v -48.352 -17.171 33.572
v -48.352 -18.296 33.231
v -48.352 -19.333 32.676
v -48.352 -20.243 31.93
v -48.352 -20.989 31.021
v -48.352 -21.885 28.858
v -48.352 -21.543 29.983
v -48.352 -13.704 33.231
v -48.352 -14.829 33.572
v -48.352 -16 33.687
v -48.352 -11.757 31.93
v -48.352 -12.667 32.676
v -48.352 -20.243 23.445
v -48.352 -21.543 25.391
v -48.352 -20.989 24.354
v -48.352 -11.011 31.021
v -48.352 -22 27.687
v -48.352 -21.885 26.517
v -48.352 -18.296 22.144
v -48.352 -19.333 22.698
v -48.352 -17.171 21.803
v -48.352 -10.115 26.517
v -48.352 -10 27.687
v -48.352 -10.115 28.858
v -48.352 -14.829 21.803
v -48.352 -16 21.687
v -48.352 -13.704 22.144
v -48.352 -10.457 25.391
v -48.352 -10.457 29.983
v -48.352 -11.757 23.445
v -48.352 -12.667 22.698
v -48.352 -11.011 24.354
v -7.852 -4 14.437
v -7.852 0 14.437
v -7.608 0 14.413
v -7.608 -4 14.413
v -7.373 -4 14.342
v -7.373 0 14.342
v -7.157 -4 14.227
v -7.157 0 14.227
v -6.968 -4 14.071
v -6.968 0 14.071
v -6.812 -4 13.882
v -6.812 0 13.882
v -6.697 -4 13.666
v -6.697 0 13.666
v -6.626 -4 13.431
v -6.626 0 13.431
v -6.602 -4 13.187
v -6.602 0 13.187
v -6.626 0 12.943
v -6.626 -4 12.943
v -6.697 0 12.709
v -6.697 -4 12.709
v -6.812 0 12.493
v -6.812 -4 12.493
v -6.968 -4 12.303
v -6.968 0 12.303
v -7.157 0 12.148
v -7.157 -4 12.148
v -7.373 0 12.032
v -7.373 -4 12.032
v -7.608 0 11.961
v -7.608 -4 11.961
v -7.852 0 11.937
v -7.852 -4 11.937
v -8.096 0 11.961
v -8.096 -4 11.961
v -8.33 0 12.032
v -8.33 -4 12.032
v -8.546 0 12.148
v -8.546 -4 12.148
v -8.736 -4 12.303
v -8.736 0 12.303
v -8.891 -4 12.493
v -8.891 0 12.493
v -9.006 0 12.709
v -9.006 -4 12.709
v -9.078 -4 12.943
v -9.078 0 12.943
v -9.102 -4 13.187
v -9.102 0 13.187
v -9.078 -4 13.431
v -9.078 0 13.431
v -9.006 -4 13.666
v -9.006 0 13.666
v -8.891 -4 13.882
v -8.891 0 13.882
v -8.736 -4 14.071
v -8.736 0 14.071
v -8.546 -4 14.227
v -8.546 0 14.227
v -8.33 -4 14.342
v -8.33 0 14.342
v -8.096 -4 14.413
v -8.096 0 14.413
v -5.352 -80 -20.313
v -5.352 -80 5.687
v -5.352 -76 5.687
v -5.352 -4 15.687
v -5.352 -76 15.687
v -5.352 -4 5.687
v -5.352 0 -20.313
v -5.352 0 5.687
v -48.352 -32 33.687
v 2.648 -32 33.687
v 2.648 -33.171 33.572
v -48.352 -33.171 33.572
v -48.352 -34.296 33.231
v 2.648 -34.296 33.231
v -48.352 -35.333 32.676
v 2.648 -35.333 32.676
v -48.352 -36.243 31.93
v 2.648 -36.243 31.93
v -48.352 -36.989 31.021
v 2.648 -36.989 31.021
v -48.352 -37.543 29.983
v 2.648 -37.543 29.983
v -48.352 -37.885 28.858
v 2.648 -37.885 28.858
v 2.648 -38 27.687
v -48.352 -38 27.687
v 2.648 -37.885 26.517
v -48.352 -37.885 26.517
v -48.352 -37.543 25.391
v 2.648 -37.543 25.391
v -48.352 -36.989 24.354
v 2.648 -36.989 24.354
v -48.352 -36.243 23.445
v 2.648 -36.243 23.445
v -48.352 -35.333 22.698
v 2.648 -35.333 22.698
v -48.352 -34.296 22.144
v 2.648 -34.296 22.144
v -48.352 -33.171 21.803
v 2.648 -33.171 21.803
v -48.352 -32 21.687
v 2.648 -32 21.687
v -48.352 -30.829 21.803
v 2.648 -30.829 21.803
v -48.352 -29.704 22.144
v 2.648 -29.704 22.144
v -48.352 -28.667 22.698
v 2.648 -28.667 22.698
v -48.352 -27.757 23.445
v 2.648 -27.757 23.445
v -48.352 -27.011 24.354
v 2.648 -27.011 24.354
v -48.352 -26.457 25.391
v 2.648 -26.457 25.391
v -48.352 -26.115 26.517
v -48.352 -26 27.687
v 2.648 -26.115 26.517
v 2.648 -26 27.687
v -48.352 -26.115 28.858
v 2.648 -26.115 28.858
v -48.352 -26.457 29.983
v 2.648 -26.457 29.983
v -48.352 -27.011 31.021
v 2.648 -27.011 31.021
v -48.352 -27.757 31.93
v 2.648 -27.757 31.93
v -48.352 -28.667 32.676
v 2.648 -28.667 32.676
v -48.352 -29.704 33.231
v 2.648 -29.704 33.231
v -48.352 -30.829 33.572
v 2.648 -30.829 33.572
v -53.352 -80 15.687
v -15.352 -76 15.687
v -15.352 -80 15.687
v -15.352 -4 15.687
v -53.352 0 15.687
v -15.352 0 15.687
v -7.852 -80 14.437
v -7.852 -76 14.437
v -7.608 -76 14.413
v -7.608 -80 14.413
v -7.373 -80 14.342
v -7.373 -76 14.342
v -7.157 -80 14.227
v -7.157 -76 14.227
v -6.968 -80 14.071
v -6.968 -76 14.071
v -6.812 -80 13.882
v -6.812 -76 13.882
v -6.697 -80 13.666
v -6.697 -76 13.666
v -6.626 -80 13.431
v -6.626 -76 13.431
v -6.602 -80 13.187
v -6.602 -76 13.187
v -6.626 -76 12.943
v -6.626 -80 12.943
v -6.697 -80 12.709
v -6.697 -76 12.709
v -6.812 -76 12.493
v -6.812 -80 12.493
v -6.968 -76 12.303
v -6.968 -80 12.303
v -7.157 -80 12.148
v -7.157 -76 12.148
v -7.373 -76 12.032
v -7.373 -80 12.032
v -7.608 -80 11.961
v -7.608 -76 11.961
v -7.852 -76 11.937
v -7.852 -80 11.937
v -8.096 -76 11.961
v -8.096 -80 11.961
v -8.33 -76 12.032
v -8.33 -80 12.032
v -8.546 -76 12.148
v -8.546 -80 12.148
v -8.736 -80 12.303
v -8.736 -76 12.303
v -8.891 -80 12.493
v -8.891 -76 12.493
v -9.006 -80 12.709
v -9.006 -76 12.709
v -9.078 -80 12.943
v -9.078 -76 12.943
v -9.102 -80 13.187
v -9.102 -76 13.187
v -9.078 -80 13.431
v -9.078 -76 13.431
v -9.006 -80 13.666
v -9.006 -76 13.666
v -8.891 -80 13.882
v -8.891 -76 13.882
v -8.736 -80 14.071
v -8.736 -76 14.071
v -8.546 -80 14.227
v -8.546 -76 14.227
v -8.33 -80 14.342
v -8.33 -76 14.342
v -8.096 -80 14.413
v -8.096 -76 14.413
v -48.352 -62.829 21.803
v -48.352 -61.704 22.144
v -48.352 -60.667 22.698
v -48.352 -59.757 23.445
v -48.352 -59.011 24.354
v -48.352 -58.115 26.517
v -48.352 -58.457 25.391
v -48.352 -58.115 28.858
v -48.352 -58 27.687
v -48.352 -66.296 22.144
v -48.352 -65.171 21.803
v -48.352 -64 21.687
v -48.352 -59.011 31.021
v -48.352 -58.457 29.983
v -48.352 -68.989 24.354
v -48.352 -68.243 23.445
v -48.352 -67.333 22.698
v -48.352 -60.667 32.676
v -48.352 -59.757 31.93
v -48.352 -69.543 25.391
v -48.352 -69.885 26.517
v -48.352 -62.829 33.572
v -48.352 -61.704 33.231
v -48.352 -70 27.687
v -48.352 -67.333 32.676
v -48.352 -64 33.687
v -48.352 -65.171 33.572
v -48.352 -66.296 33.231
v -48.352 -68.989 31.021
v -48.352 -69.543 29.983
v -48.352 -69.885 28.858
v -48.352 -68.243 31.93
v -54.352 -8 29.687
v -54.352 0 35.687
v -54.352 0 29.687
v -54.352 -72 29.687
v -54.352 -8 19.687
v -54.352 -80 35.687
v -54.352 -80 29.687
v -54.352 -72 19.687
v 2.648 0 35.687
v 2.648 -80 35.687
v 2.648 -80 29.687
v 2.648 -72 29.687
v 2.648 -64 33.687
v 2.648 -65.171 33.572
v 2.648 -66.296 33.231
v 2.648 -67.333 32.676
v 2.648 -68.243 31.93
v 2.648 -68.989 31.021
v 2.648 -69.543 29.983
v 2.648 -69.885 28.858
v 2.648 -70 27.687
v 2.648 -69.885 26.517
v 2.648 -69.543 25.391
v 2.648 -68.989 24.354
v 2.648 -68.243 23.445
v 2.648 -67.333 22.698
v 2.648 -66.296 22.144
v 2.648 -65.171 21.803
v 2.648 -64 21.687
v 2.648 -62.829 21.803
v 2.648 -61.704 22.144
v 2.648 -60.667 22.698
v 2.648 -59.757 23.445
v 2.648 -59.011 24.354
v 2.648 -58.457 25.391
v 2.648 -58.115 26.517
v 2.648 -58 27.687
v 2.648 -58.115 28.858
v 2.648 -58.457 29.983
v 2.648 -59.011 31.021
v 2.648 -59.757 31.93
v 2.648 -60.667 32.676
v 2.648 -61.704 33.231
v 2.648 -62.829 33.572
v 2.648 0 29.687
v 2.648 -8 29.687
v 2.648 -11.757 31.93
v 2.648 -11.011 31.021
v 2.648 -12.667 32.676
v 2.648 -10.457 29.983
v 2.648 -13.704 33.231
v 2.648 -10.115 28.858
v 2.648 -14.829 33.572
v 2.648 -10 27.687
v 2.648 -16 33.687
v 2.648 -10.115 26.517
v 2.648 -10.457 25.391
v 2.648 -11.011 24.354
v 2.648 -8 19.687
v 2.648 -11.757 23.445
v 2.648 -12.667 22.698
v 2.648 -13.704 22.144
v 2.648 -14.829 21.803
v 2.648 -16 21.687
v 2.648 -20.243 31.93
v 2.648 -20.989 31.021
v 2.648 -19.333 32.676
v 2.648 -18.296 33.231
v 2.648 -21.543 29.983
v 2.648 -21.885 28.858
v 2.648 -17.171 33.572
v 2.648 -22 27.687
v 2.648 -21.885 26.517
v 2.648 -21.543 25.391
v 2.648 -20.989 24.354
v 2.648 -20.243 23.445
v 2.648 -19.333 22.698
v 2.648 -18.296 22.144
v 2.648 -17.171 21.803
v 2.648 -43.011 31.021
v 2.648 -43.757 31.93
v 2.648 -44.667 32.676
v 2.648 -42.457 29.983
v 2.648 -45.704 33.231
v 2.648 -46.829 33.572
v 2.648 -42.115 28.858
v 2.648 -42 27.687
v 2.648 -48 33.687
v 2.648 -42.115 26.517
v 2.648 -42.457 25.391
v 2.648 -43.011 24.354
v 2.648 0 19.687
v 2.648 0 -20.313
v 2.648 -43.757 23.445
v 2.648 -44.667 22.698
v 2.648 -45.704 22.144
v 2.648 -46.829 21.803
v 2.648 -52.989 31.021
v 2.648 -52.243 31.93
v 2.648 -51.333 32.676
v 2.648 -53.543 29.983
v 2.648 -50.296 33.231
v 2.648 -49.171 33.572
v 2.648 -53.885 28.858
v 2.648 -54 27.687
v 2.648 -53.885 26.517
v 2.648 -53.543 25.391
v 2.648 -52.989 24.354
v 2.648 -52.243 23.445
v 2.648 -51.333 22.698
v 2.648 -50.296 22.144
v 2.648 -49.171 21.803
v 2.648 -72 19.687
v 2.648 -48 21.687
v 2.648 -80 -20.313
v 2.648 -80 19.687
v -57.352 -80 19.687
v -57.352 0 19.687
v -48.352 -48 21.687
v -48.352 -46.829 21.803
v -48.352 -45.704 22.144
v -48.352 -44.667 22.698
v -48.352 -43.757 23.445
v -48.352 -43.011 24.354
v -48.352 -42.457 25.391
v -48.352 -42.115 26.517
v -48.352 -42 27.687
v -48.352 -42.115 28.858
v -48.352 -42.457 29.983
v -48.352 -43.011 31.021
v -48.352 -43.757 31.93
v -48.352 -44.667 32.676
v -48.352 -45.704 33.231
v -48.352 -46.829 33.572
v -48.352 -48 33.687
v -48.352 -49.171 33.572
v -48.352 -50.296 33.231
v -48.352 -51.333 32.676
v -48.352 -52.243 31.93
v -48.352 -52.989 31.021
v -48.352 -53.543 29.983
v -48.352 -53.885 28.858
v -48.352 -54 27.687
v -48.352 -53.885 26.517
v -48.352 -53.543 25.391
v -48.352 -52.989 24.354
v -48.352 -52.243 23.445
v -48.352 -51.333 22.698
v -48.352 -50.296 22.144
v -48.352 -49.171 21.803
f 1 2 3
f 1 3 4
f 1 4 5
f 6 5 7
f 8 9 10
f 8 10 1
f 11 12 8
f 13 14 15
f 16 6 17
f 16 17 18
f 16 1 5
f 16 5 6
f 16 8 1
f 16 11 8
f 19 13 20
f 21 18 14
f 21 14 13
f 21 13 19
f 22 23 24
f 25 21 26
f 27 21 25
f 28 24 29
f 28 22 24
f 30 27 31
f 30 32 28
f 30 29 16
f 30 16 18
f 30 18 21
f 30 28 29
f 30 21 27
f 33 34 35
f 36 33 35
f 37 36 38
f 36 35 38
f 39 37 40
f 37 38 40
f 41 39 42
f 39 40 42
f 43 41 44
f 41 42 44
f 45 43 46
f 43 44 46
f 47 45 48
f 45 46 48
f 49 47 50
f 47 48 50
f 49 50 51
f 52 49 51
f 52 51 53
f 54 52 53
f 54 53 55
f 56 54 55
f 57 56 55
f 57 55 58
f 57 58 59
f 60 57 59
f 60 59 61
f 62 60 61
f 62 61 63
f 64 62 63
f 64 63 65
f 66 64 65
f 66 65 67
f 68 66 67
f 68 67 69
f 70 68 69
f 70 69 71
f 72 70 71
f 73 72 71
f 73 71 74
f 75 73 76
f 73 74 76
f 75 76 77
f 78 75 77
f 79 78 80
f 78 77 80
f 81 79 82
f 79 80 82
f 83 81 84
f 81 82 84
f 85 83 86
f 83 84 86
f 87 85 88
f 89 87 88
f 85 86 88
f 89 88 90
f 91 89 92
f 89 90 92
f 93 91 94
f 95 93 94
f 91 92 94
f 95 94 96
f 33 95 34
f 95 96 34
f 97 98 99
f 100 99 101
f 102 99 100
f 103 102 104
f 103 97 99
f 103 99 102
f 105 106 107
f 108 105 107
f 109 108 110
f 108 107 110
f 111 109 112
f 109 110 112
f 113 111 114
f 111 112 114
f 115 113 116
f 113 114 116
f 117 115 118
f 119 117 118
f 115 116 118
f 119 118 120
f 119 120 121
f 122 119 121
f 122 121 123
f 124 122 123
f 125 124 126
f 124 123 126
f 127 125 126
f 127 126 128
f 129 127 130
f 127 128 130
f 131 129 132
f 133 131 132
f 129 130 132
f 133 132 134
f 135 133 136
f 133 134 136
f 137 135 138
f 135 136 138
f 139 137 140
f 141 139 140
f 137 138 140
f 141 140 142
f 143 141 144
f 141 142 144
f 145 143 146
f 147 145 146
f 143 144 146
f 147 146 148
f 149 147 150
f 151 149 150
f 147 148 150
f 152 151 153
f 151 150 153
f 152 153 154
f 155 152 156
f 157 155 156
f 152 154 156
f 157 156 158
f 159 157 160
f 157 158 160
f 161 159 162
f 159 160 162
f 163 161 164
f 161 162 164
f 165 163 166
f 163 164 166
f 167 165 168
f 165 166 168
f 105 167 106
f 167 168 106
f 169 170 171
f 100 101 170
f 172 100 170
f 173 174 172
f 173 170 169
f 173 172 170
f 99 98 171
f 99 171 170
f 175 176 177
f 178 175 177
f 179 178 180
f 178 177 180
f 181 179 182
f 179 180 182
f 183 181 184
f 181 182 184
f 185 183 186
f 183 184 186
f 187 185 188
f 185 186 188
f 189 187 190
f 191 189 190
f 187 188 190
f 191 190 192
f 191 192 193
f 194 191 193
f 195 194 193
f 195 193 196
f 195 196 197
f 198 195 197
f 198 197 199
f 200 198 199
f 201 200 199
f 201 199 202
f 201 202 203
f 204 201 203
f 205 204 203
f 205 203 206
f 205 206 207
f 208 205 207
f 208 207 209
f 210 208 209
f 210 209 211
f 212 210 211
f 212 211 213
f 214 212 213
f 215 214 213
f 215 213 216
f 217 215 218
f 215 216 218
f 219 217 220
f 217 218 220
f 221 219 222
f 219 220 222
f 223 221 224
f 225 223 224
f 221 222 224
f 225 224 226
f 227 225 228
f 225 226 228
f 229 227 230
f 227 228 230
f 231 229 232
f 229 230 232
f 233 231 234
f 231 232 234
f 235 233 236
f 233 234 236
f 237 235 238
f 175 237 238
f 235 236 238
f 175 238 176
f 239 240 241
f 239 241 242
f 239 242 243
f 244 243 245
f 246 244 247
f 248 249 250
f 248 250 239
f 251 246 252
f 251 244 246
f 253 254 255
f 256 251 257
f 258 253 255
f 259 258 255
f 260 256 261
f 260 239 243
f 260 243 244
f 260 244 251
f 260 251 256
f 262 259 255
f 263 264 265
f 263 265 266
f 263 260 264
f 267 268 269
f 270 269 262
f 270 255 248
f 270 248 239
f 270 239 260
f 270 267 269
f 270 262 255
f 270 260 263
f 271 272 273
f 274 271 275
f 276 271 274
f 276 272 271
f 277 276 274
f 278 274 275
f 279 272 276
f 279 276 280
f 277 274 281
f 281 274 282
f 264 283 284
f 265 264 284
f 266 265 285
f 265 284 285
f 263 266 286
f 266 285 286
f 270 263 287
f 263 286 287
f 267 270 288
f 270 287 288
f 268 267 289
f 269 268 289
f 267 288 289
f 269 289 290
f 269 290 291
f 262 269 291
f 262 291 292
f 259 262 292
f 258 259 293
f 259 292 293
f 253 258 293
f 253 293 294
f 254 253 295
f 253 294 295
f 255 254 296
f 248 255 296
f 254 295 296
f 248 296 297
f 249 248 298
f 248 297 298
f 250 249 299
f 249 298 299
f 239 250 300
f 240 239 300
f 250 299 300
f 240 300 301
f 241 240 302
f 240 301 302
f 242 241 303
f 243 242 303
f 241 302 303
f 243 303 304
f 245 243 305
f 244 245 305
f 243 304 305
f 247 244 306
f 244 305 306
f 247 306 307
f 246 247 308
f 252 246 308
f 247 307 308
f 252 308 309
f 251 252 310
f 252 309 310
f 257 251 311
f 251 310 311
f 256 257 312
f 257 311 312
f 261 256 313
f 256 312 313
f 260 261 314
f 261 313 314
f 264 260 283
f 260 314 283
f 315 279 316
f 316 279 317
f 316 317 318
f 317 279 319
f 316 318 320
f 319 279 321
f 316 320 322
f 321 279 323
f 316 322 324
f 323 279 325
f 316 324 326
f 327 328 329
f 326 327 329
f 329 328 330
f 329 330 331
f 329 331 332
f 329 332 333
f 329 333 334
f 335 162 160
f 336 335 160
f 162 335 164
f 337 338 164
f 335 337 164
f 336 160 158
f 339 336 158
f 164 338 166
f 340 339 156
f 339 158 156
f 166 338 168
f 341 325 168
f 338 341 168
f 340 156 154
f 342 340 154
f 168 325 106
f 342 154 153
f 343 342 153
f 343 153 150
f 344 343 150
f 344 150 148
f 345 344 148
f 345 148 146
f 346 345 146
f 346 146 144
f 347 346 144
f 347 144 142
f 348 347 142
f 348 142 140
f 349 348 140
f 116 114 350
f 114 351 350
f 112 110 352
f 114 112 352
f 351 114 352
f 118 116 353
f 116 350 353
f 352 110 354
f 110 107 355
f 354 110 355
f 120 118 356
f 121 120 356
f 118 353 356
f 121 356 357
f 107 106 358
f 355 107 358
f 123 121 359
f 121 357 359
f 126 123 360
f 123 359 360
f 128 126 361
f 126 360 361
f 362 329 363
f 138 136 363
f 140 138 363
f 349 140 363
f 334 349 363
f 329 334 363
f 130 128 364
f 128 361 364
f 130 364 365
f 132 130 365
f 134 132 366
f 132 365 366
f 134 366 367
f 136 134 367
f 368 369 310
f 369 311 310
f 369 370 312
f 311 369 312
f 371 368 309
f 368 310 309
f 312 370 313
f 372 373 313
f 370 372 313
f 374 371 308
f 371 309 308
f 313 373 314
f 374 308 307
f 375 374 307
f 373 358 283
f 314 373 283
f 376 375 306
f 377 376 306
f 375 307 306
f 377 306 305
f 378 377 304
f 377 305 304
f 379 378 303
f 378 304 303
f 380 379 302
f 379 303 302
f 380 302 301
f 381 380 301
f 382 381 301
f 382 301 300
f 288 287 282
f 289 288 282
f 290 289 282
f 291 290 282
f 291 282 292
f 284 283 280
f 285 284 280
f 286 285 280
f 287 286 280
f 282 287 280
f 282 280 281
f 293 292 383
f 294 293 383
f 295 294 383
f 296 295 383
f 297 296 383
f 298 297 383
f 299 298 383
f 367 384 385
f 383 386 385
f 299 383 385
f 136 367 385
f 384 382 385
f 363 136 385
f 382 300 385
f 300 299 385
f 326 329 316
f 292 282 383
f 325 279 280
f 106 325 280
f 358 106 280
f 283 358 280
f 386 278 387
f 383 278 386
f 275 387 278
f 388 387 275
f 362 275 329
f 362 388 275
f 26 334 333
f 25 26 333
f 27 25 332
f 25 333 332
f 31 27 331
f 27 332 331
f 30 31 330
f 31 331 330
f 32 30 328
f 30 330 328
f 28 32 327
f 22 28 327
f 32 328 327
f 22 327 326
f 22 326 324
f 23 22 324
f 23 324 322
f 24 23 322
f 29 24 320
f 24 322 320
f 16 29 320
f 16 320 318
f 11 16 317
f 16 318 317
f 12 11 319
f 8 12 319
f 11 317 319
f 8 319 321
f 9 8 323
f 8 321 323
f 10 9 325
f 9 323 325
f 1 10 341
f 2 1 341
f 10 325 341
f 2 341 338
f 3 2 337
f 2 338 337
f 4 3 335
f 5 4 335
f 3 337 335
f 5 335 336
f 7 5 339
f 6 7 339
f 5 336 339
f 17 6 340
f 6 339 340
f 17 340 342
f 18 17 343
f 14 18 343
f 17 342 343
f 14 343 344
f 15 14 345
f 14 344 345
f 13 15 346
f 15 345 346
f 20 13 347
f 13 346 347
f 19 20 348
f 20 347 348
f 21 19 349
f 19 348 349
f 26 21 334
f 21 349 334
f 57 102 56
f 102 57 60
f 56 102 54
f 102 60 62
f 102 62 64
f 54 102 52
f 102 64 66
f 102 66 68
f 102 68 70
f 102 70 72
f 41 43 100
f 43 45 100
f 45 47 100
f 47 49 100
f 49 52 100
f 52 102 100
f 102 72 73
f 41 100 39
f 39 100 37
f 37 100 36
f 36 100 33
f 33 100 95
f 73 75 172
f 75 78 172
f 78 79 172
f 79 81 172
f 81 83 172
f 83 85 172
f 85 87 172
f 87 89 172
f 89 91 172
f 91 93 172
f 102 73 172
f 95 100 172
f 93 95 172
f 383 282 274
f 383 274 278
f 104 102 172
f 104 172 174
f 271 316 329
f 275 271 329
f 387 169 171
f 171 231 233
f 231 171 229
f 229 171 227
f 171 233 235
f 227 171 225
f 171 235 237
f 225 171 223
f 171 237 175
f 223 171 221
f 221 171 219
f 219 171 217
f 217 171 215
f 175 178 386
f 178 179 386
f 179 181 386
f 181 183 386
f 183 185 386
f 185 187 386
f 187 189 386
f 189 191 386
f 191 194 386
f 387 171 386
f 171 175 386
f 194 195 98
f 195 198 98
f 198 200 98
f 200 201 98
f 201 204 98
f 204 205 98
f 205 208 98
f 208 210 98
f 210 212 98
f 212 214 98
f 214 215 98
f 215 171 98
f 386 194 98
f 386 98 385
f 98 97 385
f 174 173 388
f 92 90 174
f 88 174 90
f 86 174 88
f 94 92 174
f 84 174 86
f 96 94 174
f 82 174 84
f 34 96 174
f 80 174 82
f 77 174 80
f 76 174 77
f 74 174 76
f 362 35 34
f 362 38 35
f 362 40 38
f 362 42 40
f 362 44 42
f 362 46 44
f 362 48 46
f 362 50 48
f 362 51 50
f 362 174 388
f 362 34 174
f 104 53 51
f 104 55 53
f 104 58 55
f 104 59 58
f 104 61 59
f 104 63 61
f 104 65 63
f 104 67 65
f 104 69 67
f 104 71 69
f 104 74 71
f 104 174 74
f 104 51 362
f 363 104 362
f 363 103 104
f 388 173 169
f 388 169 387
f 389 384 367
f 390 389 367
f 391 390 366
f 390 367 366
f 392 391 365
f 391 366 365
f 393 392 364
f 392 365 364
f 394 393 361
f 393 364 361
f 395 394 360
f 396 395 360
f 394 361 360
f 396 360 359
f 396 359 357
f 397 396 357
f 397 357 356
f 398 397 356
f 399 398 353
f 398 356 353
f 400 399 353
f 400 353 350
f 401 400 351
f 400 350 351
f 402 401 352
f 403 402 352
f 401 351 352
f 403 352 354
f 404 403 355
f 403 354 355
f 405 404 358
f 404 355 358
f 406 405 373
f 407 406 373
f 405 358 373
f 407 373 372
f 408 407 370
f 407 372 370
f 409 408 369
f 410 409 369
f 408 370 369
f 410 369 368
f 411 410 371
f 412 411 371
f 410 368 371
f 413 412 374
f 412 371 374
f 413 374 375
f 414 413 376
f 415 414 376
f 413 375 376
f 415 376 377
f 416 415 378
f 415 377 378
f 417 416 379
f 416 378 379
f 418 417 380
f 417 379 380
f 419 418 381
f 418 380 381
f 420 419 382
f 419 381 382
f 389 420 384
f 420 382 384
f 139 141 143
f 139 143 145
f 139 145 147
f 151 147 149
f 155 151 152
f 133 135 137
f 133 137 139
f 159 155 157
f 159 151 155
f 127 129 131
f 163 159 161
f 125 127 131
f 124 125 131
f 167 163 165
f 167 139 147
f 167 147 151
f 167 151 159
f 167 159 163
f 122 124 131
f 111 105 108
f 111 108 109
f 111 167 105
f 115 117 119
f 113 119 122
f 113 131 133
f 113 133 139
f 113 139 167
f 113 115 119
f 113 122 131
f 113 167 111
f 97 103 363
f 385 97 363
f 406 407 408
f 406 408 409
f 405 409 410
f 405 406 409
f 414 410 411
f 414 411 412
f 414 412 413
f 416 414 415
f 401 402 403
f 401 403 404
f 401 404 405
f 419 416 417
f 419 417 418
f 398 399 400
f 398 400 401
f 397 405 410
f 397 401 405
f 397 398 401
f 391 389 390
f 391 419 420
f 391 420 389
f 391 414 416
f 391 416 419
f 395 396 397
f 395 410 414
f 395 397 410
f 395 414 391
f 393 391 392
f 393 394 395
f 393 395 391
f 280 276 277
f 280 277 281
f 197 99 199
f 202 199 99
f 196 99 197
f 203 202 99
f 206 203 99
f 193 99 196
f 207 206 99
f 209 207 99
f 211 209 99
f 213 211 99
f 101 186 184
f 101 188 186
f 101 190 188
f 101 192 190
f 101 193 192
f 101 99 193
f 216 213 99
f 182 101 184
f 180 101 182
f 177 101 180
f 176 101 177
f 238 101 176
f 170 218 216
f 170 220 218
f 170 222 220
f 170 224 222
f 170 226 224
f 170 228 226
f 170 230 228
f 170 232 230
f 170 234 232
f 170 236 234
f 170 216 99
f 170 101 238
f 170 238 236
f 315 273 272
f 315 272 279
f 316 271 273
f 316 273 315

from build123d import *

# Parameters (mm, degrees)
SKETCH1_W           = 20
SKETCH1_H           = 40
BOSS_EXTRUDE1_DEPTH = 80
SKETCH8_W           = 16
SKETCH8_H           = 64
BOSS_EXTRUDE2_DEPTH = 57
SKETCH10_R          = 6
CUT_EXTRUDE1_DEPTH  = 51
SKETCH12_W          = 57
SKETCH12_H          = 6
BOSS_EXTRUDE3_DEPTH = 8
SKETCH14_W          = 57
SKETCH14_H          = 6
BOSS_EXTRUDE4_DEPTH = 8
SKETCH17_W          = 48
SKETCH17_H          = 80
CUT_EXTRUDE4_DEPTH  = 36
CHAMFER1_SIZE       = 10
SKETCH16_W          = 48
SKETCH16_H          = 72
CUT_EXTRUDE5_DEPTH  = 10
SKETCH19_R          = 1.25
CUT_EXTRUDE6_DEPTH  = 105.703357948


with BuildPart() as part:
    # Sketch1 → Boss-Extrude1 (new body)
    with BuildSketch(Plane(origin=(0, 0, 0), x_dir=(1, 0, 0), z_dir=(0, 1, 0))):
        Polygon((-17.351649908, 20.312727502), (-57.351649908, -19.687272498), (-17.351649908, -19.687272498), align=None)
        with Locations((-7.351649908, 0.312727502)):
            Rectangle(SKETCH1_W, SKETCH1_H)
    extrude(amount=-BOSS_EXTRUDE1_DEPTH)

    # Sketch8 → Boss-Extrude2 (add)
    with BuildSketch(Plane(origin=(2.648350092, 0, 0), x_dir=(0, 0, -1), z_dir=(1, 0, 0))):
        with Locations((-27.687272498, -40)):
            Rectangle(SKETCH8_W, SKETCH8_H)
    extrude(amount=-BOSS_EXTRUDE2_DEPTH)

    # Sketch10 → Cut-Extrude1 (cut)
    with BuildSketch(Plane(origin=(2.648350092, 0, 0), x_dir=(0, 0, -1), z_dir=(1, 0, 0))):
        with Locations((-27.687272498, -16)):
            Circle(SKETCH10_R)
        with Locations(Location((-27.687272498, -32, 0), (0, 0, 180))):
            Circle(SKETCH10_R)
        with Locations(Location((-27.687272498, -64, 0), (0, 0, 180))):
            Circle(SKETCH10_R)
        with Locations((-27.687272498, -48)):
            Circle(SKETCH10_R)
    extrude(amount=-CUT_EXTRUDE1_DEPTH, mode=Mode.SUBTRACT)

    # Sketch12 → Boss-Extrude3 (add)
    with BuildSketch(Plane.XZ.offset(72)):
        with Locations((-25.851649908, 32.687272498)):
            Rectangle(SKETCH12_W, SKETCH12_H)
    extrude(amount=BOSS_EXTRUDE3_DEPTH)

    # Sketch14 → Boss-Extrude4 (add)
    with BuildSketch(Plane(origin=(0, -8, 0), x_dir=(1, 0, 0), z_dir=(0, 1, 0))):
        with Locations((-25.851649908, -32.687272498)):
            Rectangle(SKETCH14_W, SKETCH14_H)
    extrude(amount=BOSS_EXTRUDE4_DEPTH)

    # Sketch17 → Cut-Extrude4 (cut)
    with BuildSketch(Plane(origin=(0, 0, -20.312727502), x_dir=(-1, 0, 0), z_dir=(0, 0, -1))):
        with Locations((29.351649908, -40)):
            Rectangle(SKETCH17_W, SKETCH17_H)
    extrude(amount=-CUT_EXTRUDE4_DEPTH, mode=Mode.SUBTRACT)

    # Chamfer1
    chamfer1_edges = [part.edges().sort_by_distance(p)[0] for p in [
        (-5.351649908, -40, 15.687272498),
    ]]
    chamfer(chamfer1_edges, length=CHAMFER1_SIZE)

    # Sketch16 → Cut-Extrude5 (cut)
    with BuildSketch(Plane(origin=(0, 0, 15.687272498), x_dir=(-1, 0, 0), z_dir=(0, 0, -1))):
        with Locations((29.351649908, -40)):
            Rectangle(SKETCH16_W, SKETCH16_H)
    extrude(amount=CUT_EXTRUDE5_DEPTH, mode=Mode.SUBTRACT)

    # Sketch19 → Cut-Extrude6 (cut, through all)
    with BuildSketch(Plane(origin=(0, 0, 0), x_dir=(1, 0, 0), z_dir=(0, 1, 0))):
        with Locations(Location((-7.851649908, -13.187272498, 0), (0, 0, 270))):
            Circle(SKETCH19_R)
    extrude(amount=-CUT_EXTRUDE6_DEPTH, mode=Mode.SUBTRACT)


solid = part.part
